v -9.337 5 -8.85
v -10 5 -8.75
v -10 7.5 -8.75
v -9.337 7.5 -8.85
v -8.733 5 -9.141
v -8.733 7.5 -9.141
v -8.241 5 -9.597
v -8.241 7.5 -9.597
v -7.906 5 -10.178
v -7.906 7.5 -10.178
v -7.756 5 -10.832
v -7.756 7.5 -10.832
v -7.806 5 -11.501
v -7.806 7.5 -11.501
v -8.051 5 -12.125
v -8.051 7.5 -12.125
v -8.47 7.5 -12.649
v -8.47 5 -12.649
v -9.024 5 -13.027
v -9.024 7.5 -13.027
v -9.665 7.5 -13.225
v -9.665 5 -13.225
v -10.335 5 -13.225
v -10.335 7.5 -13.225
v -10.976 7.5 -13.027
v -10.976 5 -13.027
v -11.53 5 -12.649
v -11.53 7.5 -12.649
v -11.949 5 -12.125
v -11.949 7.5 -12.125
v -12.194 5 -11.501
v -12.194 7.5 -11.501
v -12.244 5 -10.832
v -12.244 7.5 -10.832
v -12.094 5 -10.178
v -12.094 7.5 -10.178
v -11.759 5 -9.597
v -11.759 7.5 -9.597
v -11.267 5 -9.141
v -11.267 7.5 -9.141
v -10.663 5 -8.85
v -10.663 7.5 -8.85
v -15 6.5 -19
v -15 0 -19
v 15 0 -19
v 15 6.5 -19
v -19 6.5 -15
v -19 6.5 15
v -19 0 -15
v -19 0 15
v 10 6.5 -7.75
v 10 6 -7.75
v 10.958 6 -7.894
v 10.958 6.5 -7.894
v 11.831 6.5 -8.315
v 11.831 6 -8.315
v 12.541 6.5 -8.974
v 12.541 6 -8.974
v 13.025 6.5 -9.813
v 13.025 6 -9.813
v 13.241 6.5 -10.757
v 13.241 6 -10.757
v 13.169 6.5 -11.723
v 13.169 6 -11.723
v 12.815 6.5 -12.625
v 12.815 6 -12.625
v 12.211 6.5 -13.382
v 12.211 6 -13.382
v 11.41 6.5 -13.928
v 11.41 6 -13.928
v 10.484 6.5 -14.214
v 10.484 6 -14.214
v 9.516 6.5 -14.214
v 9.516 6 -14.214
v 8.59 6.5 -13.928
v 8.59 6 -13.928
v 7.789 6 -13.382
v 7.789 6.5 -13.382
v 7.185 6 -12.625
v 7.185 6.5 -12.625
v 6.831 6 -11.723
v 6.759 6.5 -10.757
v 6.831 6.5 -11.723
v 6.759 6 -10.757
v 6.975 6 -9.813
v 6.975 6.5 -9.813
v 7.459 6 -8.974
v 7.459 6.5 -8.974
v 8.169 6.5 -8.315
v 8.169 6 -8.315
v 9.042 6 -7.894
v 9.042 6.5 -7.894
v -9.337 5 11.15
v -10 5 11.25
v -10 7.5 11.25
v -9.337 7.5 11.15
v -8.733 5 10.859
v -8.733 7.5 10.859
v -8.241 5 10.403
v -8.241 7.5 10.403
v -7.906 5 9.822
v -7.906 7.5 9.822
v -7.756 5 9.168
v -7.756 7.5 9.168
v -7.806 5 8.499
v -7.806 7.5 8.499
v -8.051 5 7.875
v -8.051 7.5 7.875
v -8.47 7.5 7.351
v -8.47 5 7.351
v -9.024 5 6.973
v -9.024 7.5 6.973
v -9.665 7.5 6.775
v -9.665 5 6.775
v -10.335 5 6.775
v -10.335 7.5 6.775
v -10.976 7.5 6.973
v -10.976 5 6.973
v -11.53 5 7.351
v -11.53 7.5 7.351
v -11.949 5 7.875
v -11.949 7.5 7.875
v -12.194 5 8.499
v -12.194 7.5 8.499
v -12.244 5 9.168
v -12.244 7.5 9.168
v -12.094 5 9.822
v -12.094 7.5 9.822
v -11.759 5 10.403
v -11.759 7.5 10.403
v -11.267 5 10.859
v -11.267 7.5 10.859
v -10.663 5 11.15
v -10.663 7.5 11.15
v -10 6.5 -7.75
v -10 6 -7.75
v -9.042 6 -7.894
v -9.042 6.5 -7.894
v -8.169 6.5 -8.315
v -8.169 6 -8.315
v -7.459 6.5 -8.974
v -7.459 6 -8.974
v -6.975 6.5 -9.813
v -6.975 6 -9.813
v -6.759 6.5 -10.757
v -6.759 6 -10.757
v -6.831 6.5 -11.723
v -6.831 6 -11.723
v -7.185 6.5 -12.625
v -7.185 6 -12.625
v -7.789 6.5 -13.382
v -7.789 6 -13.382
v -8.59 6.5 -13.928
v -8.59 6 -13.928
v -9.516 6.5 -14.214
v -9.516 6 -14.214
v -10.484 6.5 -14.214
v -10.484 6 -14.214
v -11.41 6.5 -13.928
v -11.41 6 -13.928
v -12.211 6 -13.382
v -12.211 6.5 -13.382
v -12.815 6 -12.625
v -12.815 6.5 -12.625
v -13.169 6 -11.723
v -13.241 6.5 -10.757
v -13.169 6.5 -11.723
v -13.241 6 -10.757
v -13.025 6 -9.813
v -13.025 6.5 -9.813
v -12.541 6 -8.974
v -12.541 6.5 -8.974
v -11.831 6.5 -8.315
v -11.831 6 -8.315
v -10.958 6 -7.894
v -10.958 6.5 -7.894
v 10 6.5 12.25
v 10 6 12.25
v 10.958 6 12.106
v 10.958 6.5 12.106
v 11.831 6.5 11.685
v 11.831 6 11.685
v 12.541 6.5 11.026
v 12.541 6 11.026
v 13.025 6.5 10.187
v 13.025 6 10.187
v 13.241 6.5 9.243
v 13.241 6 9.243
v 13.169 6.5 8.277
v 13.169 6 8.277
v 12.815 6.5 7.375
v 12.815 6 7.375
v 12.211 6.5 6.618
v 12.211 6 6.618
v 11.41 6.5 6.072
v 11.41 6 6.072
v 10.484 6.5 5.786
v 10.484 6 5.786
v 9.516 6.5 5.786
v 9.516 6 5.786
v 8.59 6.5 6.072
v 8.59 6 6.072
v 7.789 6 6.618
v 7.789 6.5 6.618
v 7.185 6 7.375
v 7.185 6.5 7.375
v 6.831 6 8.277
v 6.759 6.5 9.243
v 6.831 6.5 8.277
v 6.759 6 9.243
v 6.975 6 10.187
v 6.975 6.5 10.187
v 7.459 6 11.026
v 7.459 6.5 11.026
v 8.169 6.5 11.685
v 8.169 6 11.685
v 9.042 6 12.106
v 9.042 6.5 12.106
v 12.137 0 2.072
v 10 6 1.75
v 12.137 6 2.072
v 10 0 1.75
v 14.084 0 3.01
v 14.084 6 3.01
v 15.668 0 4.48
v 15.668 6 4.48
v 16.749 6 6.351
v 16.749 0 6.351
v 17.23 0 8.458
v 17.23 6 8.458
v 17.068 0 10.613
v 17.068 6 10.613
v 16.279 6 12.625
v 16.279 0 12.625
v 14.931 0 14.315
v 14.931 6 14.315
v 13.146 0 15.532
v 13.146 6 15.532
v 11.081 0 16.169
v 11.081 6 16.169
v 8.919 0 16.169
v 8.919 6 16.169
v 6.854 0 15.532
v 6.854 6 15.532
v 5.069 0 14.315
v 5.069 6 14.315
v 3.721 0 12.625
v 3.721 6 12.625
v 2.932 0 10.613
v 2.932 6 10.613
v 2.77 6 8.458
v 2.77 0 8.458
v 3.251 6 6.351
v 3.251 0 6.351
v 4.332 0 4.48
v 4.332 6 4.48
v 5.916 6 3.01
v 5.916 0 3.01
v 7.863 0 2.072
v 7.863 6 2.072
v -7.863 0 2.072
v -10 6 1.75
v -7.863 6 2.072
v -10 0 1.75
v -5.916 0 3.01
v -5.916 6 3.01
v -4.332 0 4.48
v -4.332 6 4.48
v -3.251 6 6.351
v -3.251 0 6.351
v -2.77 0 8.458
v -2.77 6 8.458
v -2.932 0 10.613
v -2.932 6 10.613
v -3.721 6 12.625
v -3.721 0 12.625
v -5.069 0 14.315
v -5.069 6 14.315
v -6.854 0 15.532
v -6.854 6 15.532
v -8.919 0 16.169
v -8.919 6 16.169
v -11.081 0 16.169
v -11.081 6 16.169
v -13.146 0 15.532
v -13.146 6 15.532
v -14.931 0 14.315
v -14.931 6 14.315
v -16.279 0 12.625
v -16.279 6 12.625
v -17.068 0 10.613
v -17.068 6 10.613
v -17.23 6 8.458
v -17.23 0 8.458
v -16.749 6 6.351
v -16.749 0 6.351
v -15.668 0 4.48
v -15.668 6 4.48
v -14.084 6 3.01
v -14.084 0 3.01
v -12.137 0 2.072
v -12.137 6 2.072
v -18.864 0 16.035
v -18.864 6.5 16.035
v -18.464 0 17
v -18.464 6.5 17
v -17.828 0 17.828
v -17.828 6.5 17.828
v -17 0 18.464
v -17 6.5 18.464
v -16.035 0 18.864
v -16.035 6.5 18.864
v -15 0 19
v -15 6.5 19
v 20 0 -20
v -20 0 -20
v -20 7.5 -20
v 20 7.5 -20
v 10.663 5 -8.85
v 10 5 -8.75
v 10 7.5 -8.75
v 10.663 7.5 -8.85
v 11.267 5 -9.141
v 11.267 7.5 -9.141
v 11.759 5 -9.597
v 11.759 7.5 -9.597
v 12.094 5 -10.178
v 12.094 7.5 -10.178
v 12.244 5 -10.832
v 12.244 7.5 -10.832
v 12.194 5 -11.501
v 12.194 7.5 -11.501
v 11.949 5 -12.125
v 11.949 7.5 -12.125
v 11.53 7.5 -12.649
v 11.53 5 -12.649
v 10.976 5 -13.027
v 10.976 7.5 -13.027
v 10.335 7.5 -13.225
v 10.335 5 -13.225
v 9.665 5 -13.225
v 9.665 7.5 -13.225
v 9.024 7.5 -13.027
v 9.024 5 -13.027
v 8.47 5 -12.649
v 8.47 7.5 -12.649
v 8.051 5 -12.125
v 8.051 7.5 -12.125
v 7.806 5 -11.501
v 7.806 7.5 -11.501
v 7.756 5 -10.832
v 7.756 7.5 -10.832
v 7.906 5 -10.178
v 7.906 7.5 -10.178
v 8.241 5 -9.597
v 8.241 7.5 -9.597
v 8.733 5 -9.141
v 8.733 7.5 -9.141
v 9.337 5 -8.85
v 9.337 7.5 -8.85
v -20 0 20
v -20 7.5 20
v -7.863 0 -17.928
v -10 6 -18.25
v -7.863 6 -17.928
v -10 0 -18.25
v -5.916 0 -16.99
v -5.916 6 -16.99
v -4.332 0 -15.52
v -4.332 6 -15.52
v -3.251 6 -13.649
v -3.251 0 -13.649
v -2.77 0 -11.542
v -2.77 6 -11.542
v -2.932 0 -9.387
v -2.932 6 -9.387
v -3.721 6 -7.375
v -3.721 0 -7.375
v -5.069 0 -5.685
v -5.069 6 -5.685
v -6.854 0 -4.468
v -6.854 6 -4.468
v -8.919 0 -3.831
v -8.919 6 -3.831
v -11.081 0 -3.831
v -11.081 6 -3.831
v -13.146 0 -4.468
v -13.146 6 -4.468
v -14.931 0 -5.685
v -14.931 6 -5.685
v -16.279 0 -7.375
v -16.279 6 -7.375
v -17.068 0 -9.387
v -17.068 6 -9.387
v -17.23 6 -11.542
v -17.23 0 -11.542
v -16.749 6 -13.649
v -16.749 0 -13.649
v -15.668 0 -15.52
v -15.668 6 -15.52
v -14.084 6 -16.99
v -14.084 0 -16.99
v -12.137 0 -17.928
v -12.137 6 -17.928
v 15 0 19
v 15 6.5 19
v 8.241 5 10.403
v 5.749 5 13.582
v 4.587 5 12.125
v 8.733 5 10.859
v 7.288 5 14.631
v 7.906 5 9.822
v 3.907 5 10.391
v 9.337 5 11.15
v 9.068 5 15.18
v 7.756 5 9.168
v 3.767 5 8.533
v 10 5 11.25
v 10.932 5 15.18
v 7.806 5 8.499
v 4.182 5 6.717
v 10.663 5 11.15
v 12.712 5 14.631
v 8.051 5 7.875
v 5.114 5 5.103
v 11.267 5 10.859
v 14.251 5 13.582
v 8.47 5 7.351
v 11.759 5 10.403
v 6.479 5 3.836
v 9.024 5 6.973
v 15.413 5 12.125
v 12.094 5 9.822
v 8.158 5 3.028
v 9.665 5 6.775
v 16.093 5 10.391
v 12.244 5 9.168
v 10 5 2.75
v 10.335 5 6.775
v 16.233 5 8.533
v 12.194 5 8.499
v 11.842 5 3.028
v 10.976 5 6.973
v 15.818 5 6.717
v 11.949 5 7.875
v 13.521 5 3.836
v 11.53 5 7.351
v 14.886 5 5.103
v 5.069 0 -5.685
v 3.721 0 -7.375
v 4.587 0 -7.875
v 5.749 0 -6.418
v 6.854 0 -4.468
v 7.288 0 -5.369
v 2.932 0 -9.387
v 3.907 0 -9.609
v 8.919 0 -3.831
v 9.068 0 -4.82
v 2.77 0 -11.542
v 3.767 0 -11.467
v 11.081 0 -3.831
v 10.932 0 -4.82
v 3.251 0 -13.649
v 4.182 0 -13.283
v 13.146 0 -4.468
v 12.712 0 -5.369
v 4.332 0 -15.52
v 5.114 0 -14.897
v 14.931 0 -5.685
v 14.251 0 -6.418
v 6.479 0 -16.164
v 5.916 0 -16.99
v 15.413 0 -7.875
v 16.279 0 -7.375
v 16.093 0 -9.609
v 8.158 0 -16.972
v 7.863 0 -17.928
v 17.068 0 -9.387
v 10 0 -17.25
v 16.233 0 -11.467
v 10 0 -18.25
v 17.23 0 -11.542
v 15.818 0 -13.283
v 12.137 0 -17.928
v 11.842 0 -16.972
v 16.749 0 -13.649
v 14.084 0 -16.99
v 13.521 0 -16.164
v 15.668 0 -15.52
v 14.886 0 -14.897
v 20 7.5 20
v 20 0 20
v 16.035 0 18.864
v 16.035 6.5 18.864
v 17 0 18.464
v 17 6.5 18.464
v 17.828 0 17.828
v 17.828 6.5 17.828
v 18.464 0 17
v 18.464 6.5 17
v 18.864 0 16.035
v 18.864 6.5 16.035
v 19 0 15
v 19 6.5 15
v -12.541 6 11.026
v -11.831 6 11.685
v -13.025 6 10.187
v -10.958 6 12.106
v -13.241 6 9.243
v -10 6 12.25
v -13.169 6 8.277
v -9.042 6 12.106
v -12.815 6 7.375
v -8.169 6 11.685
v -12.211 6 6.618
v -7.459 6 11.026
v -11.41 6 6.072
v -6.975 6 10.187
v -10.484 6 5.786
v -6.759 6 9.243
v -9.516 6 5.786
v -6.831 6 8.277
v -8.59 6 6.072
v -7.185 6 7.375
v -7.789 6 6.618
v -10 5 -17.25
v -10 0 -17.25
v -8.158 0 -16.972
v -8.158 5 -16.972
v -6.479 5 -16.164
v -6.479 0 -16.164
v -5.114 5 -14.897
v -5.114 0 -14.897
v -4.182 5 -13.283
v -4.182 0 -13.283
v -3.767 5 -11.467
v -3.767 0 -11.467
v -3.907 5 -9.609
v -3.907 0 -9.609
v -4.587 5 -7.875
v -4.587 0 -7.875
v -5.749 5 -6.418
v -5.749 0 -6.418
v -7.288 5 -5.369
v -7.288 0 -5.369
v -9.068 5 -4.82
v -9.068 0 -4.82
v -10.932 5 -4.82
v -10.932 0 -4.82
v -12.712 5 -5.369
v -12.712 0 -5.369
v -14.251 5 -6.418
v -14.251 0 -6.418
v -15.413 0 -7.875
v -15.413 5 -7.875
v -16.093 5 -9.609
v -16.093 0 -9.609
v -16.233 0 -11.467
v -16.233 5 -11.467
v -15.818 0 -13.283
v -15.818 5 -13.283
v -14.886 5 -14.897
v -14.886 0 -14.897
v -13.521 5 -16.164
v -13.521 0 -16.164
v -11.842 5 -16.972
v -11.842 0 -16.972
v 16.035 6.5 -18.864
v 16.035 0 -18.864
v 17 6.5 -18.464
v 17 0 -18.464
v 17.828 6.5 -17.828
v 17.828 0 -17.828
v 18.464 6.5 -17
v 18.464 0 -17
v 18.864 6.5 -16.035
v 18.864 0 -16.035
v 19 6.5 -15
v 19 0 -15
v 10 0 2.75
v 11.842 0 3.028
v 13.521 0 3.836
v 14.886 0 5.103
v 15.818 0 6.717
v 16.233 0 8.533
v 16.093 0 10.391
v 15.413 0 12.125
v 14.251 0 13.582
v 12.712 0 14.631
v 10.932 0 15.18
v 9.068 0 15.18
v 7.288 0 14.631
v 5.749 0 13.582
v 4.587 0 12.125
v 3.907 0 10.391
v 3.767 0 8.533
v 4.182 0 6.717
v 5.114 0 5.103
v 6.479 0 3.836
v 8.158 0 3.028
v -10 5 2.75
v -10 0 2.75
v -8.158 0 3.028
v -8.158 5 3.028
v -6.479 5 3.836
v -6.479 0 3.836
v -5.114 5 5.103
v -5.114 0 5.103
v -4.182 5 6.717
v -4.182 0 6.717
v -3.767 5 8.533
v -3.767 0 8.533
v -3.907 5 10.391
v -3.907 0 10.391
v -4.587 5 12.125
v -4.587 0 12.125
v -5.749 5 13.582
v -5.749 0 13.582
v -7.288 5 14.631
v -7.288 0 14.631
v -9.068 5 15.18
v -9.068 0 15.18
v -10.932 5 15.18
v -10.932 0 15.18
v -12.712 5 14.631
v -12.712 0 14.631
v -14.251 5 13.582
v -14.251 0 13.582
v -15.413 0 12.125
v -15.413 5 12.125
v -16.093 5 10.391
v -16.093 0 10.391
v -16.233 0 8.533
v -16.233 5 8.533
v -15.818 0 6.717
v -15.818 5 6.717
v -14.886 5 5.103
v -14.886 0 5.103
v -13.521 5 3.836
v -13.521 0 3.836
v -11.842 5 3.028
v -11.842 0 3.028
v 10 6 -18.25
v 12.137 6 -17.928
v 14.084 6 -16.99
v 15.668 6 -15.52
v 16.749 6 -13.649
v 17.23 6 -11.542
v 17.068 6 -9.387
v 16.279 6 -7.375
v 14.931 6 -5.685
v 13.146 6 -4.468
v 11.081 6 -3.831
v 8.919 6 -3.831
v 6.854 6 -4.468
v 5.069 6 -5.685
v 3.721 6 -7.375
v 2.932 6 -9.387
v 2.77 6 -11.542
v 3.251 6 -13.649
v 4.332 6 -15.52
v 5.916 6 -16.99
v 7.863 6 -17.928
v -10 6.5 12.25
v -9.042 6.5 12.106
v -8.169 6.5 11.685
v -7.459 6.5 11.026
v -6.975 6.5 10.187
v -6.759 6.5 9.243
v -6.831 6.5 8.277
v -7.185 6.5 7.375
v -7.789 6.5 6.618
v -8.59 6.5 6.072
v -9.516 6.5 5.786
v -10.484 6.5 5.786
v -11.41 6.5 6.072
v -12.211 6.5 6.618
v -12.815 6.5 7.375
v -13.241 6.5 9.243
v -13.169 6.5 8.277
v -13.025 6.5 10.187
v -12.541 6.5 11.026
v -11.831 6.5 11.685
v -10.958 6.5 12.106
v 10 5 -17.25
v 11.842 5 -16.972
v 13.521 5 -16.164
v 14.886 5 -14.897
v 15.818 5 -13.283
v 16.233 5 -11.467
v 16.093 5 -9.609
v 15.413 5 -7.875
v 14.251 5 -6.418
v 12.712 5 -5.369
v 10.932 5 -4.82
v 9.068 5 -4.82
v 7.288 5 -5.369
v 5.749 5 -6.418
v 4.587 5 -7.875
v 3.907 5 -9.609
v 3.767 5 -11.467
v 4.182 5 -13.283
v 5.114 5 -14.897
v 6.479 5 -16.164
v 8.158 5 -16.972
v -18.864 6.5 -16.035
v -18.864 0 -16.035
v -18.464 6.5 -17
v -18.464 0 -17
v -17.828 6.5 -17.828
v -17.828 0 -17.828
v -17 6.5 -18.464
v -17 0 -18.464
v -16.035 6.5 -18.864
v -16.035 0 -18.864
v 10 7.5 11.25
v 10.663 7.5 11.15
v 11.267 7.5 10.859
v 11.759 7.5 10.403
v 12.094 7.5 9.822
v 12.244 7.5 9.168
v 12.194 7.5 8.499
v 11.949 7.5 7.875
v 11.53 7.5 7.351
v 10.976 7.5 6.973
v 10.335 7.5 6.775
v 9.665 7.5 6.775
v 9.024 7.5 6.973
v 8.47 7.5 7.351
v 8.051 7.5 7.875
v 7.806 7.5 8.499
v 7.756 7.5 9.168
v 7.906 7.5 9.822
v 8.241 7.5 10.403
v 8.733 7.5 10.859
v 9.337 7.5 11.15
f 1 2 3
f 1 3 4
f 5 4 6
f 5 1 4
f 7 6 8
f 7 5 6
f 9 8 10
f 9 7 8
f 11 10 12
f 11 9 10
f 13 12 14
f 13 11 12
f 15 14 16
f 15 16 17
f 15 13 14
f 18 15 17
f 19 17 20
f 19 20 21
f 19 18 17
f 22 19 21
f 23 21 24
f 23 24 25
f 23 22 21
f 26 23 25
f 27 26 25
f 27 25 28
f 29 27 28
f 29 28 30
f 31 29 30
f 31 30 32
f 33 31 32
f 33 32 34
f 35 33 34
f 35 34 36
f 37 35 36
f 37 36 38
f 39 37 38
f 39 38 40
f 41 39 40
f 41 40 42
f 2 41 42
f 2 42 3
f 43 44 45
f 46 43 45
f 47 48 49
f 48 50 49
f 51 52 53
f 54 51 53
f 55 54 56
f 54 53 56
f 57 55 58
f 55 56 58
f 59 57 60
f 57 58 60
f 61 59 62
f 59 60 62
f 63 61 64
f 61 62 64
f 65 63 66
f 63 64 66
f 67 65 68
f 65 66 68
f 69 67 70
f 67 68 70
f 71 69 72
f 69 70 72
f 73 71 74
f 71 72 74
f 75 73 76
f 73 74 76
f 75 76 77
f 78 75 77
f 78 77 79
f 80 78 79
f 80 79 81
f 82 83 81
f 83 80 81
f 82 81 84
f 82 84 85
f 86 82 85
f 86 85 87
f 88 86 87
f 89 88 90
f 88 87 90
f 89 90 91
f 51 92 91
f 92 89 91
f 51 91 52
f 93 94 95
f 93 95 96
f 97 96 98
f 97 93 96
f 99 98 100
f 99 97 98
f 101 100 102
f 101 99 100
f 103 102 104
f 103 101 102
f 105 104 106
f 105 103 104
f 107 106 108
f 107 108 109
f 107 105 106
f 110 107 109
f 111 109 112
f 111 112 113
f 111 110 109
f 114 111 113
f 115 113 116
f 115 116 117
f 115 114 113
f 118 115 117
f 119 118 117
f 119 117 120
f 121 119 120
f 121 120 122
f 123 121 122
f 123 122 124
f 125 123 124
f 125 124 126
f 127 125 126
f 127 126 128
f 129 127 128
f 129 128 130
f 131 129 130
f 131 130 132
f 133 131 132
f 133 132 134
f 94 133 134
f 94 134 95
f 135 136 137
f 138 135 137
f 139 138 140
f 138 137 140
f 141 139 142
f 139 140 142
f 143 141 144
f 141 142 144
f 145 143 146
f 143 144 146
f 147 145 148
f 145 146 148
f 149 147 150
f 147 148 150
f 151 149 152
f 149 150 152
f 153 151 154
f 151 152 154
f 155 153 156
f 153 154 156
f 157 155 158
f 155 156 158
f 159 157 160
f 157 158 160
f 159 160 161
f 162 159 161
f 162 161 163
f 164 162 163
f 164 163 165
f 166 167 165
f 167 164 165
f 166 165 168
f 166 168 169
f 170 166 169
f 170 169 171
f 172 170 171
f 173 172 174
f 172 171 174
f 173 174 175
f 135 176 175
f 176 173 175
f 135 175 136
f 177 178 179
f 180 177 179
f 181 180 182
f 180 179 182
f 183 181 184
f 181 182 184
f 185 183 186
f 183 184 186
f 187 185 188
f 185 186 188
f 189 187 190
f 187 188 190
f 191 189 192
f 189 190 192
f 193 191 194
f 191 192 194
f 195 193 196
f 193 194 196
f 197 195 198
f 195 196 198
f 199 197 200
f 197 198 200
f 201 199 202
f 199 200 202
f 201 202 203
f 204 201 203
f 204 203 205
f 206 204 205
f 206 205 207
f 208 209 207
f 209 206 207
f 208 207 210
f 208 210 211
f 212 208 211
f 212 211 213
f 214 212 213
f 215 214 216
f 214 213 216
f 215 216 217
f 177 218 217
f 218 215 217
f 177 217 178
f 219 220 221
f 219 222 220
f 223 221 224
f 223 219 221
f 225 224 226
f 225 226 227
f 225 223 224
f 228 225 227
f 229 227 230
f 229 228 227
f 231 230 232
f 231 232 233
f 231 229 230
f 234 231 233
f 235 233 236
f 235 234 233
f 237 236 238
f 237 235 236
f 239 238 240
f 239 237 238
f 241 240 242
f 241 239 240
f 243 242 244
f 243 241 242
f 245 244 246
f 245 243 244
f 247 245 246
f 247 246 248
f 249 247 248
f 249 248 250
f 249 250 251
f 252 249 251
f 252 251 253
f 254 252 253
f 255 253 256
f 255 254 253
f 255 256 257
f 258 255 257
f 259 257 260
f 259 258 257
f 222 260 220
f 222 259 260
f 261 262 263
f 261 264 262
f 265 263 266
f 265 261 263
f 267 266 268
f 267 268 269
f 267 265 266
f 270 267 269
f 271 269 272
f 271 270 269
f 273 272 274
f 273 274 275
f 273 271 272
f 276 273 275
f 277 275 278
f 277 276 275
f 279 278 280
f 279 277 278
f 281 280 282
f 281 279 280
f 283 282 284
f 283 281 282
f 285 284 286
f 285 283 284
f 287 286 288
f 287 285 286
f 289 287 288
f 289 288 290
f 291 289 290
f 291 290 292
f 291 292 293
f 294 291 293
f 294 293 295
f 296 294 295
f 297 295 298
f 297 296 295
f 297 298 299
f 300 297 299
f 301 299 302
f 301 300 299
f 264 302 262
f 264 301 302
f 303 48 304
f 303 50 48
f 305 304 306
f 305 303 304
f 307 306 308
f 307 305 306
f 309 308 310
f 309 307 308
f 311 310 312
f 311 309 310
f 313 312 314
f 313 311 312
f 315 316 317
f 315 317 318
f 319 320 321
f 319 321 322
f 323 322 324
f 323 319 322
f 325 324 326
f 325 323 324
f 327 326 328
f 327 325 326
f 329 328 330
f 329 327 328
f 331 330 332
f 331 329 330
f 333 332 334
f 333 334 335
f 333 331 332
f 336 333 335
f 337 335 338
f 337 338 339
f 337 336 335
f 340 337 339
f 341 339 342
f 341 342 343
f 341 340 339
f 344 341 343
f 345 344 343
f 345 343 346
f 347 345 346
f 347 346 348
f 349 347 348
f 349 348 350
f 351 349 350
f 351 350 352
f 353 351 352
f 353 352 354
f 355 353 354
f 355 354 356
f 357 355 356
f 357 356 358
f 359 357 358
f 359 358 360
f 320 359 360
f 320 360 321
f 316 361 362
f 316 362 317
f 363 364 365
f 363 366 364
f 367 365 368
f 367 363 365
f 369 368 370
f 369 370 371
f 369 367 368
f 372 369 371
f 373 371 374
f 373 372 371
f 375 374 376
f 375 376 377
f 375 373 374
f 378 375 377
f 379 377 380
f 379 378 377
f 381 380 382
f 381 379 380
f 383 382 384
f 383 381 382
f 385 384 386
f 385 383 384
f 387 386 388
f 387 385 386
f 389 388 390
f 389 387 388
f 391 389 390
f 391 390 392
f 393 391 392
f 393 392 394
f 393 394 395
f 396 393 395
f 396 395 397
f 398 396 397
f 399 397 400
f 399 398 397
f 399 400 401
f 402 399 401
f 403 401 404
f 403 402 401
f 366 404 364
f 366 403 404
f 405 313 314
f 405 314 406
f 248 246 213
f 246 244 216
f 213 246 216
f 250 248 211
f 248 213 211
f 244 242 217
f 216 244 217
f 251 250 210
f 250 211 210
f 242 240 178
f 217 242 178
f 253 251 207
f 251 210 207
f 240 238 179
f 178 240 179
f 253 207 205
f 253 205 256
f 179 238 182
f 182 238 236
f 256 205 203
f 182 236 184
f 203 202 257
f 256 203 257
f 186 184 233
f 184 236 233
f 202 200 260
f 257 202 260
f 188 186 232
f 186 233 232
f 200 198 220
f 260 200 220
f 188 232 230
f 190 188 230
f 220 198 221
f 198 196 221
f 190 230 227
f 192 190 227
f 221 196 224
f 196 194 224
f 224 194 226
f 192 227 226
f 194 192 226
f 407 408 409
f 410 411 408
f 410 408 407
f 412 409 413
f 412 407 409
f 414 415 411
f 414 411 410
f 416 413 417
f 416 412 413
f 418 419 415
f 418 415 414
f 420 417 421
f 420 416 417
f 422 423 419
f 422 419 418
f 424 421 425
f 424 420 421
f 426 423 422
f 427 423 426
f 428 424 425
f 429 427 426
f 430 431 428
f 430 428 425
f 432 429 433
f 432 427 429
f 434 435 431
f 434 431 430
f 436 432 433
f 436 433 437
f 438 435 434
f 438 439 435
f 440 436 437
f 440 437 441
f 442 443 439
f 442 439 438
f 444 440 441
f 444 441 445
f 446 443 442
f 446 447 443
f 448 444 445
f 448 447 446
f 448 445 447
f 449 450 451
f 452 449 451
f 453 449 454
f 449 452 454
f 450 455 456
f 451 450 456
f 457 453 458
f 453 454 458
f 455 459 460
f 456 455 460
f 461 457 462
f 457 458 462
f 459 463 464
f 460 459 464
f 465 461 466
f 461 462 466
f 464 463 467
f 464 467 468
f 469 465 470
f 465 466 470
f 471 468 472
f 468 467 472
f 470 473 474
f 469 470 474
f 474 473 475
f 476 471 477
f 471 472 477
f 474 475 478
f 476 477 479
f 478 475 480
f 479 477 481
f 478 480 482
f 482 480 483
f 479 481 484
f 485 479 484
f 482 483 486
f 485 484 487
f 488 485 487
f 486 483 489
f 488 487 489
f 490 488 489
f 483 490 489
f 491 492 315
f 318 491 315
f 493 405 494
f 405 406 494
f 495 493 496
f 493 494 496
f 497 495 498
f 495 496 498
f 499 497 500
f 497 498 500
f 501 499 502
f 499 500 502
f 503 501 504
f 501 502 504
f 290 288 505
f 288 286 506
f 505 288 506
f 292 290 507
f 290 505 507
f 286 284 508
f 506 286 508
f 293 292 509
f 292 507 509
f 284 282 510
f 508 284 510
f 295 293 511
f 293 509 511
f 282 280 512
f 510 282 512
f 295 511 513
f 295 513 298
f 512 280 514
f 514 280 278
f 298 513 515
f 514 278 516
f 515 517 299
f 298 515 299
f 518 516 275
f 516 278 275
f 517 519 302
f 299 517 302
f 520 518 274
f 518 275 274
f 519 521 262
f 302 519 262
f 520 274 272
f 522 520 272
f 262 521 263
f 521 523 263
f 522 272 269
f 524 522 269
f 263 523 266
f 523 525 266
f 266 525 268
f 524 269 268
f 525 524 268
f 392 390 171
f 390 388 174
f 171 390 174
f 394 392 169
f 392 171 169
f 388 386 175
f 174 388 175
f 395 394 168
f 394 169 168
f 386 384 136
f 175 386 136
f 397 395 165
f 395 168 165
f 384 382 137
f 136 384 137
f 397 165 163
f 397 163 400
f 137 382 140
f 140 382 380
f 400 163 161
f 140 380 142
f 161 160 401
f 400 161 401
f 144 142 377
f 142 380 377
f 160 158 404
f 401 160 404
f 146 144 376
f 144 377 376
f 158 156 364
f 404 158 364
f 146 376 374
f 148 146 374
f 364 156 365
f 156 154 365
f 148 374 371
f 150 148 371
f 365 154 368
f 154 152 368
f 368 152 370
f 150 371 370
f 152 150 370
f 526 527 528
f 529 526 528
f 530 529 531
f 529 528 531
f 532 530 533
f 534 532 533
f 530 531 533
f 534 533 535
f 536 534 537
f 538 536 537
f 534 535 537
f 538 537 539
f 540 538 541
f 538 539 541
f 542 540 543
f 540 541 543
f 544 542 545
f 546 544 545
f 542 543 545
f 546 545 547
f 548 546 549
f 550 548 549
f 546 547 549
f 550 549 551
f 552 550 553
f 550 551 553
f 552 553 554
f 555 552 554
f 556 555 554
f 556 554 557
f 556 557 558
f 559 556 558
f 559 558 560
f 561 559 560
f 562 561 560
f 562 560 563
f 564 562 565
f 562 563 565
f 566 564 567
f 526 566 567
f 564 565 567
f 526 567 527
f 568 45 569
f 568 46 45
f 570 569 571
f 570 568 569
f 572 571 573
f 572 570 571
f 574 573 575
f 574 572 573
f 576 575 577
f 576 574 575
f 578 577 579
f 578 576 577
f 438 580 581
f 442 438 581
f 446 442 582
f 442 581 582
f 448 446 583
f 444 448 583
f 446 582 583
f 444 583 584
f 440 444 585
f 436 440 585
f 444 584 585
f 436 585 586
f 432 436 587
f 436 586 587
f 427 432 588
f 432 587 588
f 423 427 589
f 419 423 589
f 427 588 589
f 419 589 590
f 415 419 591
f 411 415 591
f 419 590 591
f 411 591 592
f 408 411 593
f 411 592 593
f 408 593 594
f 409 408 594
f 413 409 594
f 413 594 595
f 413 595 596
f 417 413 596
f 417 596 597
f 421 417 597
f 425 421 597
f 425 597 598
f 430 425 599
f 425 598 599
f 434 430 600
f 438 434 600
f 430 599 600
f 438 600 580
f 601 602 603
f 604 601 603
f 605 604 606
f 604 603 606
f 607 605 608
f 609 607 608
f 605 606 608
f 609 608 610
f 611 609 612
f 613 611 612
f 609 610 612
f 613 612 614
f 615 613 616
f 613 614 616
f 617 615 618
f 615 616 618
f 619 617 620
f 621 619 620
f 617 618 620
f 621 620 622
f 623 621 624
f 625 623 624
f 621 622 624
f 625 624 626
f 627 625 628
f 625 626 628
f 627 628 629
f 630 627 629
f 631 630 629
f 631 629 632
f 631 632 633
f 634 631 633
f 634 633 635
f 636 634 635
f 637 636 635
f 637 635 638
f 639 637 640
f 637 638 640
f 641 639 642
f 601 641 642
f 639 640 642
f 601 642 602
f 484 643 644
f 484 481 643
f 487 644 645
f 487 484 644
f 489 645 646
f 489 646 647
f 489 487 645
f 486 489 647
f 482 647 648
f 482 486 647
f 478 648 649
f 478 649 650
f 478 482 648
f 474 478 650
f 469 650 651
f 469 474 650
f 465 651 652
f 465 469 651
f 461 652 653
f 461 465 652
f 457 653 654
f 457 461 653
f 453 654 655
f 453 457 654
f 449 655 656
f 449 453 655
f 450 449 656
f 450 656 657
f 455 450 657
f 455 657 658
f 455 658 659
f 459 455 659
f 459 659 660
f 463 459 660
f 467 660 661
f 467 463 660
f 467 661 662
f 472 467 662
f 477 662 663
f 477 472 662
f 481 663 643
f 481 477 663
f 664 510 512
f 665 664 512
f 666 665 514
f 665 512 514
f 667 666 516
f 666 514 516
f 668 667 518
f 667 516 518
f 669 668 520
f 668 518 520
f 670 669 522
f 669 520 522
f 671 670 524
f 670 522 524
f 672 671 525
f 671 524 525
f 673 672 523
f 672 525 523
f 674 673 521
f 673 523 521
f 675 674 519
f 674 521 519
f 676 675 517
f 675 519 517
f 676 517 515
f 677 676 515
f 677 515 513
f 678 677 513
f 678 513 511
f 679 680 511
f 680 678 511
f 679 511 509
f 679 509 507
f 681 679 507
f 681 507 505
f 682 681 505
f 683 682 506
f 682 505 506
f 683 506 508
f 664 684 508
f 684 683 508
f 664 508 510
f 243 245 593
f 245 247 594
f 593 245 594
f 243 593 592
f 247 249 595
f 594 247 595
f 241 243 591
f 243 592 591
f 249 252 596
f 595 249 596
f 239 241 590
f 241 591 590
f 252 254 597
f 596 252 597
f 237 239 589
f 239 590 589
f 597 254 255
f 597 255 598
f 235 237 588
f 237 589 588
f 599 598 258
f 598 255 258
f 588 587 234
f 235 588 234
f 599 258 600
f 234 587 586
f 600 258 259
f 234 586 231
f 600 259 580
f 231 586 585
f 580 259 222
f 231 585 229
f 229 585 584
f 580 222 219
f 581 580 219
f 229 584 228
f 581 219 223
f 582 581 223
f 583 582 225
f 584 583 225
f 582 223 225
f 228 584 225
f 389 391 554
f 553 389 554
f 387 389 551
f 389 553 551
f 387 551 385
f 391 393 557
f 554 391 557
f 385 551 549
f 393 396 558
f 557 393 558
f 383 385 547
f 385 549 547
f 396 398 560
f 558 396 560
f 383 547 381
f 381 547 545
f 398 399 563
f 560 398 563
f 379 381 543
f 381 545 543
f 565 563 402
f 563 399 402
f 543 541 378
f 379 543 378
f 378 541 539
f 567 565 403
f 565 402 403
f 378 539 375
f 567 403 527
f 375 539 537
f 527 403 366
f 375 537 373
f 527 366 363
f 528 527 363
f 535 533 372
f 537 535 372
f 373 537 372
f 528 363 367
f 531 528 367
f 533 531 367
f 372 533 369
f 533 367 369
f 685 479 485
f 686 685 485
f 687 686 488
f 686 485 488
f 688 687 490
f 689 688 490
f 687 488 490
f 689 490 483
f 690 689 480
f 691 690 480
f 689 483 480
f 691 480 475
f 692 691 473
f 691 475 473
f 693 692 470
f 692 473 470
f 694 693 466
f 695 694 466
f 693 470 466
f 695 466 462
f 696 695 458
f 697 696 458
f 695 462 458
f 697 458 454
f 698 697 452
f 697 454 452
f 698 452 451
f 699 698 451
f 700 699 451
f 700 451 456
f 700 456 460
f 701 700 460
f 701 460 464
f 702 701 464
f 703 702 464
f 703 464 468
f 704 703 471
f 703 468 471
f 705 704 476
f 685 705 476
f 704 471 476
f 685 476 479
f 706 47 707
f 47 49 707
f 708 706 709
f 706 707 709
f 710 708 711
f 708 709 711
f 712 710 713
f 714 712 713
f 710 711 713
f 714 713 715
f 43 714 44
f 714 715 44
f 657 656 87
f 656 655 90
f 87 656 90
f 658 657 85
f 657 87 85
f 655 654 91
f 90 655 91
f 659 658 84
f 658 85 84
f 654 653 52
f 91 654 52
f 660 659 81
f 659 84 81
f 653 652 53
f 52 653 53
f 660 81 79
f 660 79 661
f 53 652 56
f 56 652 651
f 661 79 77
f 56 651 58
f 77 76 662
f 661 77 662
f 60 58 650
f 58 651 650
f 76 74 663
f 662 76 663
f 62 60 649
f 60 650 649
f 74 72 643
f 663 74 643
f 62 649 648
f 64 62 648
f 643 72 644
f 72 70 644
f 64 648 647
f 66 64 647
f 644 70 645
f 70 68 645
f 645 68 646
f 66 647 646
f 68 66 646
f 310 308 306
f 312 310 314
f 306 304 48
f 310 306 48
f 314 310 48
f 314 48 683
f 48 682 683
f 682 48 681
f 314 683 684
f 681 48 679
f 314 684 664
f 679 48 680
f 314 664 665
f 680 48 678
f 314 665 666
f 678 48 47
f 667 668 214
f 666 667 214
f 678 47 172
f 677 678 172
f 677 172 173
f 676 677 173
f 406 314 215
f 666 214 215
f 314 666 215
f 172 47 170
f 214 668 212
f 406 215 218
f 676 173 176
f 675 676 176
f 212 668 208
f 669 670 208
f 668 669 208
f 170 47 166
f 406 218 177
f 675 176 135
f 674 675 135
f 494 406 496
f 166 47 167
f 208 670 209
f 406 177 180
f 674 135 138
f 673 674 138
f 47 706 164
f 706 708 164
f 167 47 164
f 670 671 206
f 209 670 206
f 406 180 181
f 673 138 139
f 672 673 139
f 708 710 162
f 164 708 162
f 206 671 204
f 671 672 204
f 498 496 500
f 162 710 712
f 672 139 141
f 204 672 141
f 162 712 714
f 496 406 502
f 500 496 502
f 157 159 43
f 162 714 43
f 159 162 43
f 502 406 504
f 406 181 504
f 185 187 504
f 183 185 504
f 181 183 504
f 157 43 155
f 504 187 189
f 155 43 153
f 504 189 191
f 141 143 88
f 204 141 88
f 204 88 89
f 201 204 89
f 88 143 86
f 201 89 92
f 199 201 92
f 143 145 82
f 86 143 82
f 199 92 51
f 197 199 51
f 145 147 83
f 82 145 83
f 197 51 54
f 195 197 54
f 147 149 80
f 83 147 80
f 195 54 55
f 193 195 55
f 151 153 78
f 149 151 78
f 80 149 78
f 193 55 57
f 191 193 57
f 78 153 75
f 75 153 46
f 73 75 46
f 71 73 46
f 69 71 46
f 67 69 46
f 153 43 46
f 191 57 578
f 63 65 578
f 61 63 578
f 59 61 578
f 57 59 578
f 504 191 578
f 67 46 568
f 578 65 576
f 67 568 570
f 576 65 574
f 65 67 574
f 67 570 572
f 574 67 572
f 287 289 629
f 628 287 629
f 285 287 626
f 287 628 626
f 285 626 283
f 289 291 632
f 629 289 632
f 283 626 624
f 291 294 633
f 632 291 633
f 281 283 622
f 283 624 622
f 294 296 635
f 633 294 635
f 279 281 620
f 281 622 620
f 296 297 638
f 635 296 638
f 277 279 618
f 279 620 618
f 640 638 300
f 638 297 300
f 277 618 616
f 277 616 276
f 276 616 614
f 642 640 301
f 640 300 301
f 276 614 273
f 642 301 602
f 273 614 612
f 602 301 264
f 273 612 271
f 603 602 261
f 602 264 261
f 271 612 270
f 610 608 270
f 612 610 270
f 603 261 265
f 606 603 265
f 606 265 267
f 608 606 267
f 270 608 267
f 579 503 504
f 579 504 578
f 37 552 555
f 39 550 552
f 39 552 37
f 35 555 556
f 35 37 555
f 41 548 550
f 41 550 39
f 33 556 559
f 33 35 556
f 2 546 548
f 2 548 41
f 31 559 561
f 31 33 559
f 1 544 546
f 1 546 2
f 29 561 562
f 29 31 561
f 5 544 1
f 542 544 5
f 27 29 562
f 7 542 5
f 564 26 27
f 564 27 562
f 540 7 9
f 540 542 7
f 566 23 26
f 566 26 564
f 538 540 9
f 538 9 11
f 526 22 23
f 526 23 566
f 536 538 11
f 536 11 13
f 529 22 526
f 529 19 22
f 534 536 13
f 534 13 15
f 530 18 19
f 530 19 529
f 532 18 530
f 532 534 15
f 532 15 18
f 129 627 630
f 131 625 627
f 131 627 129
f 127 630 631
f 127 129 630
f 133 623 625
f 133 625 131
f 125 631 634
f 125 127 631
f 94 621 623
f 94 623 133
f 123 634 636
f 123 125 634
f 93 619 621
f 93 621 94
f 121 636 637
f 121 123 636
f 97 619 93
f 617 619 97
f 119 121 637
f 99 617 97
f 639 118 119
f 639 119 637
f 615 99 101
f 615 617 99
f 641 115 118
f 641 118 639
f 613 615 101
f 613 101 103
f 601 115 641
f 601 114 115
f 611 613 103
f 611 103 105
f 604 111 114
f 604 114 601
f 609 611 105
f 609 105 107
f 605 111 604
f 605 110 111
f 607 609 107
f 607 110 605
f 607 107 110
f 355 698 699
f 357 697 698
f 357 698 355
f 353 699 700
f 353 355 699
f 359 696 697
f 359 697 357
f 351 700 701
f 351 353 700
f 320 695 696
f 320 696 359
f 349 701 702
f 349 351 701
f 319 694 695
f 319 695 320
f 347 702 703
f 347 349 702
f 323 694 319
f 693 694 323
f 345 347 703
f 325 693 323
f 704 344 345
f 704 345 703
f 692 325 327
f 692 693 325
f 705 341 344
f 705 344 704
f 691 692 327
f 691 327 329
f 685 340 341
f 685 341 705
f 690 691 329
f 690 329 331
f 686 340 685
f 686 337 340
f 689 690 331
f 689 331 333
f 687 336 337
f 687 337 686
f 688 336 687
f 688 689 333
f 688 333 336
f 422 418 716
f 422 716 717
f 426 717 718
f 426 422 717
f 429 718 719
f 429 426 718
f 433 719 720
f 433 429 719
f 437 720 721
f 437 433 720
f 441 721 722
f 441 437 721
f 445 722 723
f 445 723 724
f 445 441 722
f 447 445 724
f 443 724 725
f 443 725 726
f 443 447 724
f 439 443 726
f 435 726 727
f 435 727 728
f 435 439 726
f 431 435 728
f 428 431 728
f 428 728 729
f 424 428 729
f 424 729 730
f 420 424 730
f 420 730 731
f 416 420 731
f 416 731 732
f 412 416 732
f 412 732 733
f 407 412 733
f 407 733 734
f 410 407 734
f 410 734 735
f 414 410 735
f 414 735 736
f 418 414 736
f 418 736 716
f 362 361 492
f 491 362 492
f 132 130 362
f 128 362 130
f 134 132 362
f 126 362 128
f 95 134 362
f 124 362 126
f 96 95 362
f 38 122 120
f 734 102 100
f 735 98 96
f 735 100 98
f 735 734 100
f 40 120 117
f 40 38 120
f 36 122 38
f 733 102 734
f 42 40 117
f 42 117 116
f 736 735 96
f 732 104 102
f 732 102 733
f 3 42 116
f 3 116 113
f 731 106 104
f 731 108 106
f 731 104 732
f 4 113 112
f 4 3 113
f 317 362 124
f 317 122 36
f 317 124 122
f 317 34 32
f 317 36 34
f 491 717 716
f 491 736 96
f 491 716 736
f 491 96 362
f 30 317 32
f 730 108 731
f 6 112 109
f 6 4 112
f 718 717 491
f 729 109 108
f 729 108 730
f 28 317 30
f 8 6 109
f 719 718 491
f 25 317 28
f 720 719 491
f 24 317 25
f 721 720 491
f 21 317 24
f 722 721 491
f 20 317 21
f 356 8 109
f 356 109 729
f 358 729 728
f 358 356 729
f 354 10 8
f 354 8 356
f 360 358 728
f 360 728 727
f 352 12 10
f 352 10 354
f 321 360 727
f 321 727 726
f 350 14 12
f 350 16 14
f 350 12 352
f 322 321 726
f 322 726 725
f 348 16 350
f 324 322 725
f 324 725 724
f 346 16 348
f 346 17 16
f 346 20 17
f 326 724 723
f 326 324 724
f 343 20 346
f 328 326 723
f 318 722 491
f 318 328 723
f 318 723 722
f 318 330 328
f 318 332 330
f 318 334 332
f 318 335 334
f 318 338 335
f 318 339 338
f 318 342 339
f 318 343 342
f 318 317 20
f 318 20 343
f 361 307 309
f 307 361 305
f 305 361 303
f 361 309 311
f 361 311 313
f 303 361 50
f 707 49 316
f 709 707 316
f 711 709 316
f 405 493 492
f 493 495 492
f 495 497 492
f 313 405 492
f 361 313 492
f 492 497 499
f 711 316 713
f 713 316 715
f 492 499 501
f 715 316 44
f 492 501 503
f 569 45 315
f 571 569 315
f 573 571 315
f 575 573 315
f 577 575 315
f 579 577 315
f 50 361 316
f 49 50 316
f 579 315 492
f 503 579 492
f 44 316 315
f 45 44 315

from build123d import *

# Parameters (mm, degrees)
CROQUIS1_W              = 40
CROQUIS1_H              = 40
CROQUIS1_R              = 2.25
SALIENTE_EXTRUIR1_DEPTH = 7.5
CROQUIS2_R              = 6.25
CORTAR_EXTRUIR1_DEPTH   = 5
VACIADO1_T              = -1
REDONDEO1_R             = 4


with BuildPart() as part:
    # Croquis1 → Saliente-Extruir1 (new body)
    with BuildSketch(Plane(origin=(0, 0, 0), x_dir=(1, 0, 0), z_dir=(0, 1, 0))):
        Rectangle(CROQUIS1_W, CROQUIS1_H)
        with Locations(Location((-10, -9, 0), (0, 0, 270))):
            Circle(CROQUIS1_R, mode=Mode.SUBTRACT)
        with Locations(Location((10, -9, 0), (0, 0, 270))):
            Circle(CROQUIS1_R, mode=Mode.SUBTRACT)
        with Locations(Location((10, 11, 0), (0, 0, 270))):
            Circle(CROQUIS1_R, mode=Mode.SUBTRACT)
        with Locations(Location((-10, 11, 0), (0, 0, 270))):
            Circle(CROQUIS1_R, mode=Mode.SUBTRACT)
    extrude(amount=SALIENTE_EXTRUIR1_DEPTH)

    # Croquis2 → Cortar-Extruir1 (cut)
    with BuildSketch(Plane.XZ):
        with Locations(Location((-10, 9, 0), (0, 0, 270))):
            Circle(CROQUIS2_R)
        with Locations(Location((10, 9, 0), (0, 0, 270))):
            Circle(CROQUIS2_R)
        with Locations(Location((-10, -11, 0), (0, 0, 270))):
            Circle(CROQUIS2_R)
        with Locations(Location((10, -11, 0), (0, 0, 270))):
            Circle(CROQUIS2_R)
    extrude(amount=-CORTAR_EXTRUIR1_DEPTH, mode=Mode.SUBTRACT)

    # Vaciado1
    vaciado1_openings = [part.faces().sort_by_distance(p)[0] for p in [
        (0, 0, 0.442577116),
    ]]
    offset(amount=VACIADO1_T, openings=vaciado1_openings, kind=Kind.INTERSECTION)

    # Redondeo1
    redondeo1_edges = [part.edges().sort_by_distance(p)[0] for p in [
        (-19, 3.25, -19),
        (19, 3.25, -19),
        (19, 3.25, 19),
        (-19, 3.25, 19),
    ]]
    fillet(redondeo1_edges, radius=REDONDEO1_R)


solid = part.part
